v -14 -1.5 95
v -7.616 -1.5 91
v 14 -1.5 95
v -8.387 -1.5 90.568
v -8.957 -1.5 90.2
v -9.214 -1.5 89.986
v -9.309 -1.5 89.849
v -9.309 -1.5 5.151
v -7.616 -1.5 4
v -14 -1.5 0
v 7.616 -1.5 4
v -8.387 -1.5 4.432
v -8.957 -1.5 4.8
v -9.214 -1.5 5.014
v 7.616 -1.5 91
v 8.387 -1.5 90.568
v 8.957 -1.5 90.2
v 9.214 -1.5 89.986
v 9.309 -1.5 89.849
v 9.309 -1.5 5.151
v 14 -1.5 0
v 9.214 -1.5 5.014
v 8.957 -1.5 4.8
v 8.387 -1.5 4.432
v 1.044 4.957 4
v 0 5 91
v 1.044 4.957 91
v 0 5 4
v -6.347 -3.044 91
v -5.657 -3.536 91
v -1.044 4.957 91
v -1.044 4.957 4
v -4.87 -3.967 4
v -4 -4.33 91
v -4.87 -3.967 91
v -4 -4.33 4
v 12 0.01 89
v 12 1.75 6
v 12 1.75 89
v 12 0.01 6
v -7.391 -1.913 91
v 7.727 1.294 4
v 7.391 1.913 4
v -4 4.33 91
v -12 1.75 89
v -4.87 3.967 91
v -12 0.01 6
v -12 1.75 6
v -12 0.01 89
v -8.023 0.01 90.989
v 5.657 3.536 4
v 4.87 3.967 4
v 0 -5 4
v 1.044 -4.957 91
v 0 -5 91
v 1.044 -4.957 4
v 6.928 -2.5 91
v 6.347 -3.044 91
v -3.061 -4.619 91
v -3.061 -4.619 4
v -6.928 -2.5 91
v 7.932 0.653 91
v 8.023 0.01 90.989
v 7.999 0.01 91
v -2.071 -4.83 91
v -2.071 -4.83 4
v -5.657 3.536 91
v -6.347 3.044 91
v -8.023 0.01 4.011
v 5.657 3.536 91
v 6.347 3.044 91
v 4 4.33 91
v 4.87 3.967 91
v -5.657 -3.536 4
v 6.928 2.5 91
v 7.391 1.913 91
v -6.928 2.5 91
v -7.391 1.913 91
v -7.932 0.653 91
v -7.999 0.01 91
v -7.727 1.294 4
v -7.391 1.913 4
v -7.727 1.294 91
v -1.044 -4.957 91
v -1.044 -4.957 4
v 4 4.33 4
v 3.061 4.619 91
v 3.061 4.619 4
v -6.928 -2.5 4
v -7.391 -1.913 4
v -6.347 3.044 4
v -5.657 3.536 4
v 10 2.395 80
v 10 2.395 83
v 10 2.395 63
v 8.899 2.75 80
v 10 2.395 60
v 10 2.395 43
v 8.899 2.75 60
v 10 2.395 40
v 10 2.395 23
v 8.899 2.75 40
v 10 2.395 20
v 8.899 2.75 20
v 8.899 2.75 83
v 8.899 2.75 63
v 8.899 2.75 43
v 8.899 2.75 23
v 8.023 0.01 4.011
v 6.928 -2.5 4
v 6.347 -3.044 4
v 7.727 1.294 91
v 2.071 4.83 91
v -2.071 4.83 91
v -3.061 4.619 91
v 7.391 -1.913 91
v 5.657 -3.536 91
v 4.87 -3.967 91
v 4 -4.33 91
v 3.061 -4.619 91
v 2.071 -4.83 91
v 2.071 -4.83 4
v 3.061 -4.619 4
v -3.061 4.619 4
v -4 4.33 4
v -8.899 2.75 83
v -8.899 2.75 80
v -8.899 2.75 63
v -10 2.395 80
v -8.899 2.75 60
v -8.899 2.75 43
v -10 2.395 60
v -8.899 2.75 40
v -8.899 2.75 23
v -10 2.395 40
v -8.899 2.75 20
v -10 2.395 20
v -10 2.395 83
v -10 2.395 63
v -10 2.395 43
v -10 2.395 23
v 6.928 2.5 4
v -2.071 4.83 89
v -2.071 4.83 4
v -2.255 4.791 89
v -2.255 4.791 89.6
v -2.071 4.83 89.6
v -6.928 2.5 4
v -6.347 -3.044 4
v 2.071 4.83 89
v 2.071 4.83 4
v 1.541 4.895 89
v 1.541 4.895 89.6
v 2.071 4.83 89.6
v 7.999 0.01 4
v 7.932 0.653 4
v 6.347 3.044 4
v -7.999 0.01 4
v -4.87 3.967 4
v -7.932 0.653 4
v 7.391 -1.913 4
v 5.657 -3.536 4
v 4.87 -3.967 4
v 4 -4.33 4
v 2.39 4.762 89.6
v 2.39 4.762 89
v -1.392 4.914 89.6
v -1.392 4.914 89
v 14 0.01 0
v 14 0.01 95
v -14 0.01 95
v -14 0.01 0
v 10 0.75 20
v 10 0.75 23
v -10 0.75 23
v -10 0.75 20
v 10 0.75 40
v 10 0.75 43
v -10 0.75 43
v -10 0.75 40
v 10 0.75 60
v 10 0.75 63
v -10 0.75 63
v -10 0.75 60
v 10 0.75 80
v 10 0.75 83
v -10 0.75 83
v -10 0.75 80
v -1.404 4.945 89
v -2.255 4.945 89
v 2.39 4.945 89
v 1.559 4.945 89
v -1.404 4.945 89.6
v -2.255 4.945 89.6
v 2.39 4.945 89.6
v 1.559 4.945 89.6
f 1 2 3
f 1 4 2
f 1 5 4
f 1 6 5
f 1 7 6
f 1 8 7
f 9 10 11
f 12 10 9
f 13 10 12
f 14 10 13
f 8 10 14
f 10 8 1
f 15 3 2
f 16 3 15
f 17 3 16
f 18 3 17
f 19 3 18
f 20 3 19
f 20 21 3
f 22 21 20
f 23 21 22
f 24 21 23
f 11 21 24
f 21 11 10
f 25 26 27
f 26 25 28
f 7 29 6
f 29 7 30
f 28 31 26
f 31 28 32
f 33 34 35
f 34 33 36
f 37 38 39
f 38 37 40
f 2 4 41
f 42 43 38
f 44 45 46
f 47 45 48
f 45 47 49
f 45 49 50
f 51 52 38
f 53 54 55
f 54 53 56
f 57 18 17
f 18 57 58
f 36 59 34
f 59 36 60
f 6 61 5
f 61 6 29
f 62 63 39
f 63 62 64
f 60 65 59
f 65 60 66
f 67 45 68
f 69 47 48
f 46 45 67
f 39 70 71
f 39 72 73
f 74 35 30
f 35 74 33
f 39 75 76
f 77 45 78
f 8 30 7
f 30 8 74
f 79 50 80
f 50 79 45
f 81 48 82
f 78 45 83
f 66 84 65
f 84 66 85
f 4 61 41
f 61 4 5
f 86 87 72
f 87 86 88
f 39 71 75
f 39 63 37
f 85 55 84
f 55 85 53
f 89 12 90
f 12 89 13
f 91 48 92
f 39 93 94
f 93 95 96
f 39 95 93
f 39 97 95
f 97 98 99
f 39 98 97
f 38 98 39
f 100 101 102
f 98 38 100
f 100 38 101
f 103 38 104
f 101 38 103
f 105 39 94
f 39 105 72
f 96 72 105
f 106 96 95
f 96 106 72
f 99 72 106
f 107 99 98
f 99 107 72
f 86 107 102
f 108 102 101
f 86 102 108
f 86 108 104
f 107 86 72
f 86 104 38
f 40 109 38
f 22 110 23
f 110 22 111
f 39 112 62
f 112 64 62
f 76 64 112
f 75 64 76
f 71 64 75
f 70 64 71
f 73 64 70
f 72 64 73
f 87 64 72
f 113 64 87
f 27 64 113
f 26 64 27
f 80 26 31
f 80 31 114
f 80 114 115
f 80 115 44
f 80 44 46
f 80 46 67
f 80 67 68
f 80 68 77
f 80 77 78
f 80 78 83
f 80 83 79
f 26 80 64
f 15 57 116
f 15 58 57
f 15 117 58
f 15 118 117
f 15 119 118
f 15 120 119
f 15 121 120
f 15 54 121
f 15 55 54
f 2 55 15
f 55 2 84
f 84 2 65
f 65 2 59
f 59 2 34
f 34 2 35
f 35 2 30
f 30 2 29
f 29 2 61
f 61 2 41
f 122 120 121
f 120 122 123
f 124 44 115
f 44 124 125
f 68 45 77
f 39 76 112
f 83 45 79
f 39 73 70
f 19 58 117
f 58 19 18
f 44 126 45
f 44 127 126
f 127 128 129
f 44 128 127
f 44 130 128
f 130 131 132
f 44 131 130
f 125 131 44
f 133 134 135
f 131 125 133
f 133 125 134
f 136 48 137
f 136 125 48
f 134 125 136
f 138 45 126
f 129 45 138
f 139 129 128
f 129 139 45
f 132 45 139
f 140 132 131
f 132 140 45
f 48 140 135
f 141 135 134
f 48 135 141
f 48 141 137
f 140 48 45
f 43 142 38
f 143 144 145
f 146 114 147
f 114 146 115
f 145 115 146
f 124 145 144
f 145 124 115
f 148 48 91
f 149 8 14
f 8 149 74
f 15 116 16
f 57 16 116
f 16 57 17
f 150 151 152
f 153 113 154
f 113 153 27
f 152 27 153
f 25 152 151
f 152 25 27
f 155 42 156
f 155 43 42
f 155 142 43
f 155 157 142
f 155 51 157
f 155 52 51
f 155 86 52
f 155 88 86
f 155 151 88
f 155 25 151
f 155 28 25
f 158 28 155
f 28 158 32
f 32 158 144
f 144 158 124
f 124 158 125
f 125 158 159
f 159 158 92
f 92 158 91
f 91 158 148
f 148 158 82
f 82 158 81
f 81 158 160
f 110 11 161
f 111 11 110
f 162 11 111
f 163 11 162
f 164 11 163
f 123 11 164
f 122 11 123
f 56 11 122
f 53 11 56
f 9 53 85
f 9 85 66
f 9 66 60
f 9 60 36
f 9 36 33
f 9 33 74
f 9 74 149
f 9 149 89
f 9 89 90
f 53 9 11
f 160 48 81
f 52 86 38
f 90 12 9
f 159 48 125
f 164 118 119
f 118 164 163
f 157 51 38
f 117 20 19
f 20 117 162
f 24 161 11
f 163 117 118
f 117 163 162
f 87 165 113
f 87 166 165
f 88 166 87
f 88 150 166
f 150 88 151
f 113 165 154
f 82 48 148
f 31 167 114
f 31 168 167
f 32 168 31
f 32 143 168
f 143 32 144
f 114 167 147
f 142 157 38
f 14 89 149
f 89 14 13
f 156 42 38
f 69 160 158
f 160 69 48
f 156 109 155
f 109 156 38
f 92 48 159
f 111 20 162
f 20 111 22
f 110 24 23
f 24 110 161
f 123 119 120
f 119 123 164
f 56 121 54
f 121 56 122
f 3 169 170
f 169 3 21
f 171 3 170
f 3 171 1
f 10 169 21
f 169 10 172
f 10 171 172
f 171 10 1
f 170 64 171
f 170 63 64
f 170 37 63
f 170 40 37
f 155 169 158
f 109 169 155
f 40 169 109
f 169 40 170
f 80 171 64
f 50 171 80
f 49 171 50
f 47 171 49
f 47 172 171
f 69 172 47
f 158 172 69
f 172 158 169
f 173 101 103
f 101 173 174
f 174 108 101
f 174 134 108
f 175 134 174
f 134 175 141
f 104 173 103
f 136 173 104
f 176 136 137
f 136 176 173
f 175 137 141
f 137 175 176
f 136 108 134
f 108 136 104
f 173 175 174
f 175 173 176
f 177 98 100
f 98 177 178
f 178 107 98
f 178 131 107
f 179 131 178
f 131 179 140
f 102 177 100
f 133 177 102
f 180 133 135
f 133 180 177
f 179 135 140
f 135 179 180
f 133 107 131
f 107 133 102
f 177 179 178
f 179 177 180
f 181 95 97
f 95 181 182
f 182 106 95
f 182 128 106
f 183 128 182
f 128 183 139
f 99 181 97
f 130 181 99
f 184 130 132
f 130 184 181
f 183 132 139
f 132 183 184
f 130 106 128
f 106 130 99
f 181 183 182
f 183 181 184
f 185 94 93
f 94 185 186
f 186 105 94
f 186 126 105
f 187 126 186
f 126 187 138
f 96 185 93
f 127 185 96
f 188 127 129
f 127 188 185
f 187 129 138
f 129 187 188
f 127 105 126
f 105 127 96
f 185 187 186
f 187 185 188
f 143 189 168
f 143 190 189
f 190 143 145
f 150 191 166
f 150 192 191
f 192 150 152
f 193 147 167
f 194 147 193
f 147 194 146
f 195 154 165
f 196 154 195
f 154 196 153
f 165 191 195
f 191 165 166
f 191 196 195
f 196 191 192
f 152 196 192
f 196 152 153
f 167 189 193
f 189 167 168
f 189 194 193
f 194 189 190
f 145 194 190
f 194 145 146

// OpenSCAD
// ORIGINAL TechHand/PRINT trainer CAD v0 — training tool only
// Parametric backstrap insert S/M/L — original geometry, not OEM copy.
// Adds ~2 mm circumference-ish thickness steps via size=0/1/2.

/* ===== PARAMETERS ===== */
size = 1;                  // 0=S, 1=M, 2=L
base_thick = 3.0;          // core thickness (mm)
step_mm = 2.0;             // added thickness per size step (~circumference-ish)
insert_h = 95;             // height along grip (mm)
insert_w = 28;             // width matching grip back (mm)
tab_w = 10;                // retention tab width
tab_t = 2.2;               // retention tab thickness
tab_clear = 0.25;          // mate clearance
$fn = 48;

thick = base_thick + size * step_mm;

module backstrap() {
    // Curved outer face for palm comfort — original trainer contour
    hull() {
        translate([0, 0, 4])
            scale([1, thick/8, 1])
                cylinder(h=insert_h - 8, r=8);
        translate([-insert_w/2 + 2, 0, 6])
            cube([insert_w - 4, thick * 0.35, insert_h - 12]);
    }
    // Flat mating face against grip rear channel
    translate([-insert_w/2, -1.5, 0])
        cube([insert_w, 1.5 + 0.01, insert_h]);
    // Retention tabs (top/bottom) — dovetail-ish simple rectangular tabs
    for (z = [8, insert_h - 8 - 12]) {
        translate([-tab_w/2, -1.5 - tab_t, z])
            cube([tab_w, tab_t, 12]);
    }
    // Center locating rib
    translate([-3, -1.5 - 1.2, insert_h/2 - 20])
        cube([6, 1.2, 40]);
}

difference() {
    backstrap();
    // Lightening / flex slots (trainer aesthetic, not firearm)
    for (z = [20, 40, 60, 80]) {
        translate([-insert_w/2 + 4, thick * 0.15, z])
            cube([insert_w - 8, max(0.8, thick * 0.4), 3]);
    }
}

// Size label as raised emboss (optional visual)
translate([0, thick * 0.5, insert_h - 6])
    linear_extrude(0.6)
        text(size==0?"S":size==1?"M":"L", size=5, halign="center", valign="center");
